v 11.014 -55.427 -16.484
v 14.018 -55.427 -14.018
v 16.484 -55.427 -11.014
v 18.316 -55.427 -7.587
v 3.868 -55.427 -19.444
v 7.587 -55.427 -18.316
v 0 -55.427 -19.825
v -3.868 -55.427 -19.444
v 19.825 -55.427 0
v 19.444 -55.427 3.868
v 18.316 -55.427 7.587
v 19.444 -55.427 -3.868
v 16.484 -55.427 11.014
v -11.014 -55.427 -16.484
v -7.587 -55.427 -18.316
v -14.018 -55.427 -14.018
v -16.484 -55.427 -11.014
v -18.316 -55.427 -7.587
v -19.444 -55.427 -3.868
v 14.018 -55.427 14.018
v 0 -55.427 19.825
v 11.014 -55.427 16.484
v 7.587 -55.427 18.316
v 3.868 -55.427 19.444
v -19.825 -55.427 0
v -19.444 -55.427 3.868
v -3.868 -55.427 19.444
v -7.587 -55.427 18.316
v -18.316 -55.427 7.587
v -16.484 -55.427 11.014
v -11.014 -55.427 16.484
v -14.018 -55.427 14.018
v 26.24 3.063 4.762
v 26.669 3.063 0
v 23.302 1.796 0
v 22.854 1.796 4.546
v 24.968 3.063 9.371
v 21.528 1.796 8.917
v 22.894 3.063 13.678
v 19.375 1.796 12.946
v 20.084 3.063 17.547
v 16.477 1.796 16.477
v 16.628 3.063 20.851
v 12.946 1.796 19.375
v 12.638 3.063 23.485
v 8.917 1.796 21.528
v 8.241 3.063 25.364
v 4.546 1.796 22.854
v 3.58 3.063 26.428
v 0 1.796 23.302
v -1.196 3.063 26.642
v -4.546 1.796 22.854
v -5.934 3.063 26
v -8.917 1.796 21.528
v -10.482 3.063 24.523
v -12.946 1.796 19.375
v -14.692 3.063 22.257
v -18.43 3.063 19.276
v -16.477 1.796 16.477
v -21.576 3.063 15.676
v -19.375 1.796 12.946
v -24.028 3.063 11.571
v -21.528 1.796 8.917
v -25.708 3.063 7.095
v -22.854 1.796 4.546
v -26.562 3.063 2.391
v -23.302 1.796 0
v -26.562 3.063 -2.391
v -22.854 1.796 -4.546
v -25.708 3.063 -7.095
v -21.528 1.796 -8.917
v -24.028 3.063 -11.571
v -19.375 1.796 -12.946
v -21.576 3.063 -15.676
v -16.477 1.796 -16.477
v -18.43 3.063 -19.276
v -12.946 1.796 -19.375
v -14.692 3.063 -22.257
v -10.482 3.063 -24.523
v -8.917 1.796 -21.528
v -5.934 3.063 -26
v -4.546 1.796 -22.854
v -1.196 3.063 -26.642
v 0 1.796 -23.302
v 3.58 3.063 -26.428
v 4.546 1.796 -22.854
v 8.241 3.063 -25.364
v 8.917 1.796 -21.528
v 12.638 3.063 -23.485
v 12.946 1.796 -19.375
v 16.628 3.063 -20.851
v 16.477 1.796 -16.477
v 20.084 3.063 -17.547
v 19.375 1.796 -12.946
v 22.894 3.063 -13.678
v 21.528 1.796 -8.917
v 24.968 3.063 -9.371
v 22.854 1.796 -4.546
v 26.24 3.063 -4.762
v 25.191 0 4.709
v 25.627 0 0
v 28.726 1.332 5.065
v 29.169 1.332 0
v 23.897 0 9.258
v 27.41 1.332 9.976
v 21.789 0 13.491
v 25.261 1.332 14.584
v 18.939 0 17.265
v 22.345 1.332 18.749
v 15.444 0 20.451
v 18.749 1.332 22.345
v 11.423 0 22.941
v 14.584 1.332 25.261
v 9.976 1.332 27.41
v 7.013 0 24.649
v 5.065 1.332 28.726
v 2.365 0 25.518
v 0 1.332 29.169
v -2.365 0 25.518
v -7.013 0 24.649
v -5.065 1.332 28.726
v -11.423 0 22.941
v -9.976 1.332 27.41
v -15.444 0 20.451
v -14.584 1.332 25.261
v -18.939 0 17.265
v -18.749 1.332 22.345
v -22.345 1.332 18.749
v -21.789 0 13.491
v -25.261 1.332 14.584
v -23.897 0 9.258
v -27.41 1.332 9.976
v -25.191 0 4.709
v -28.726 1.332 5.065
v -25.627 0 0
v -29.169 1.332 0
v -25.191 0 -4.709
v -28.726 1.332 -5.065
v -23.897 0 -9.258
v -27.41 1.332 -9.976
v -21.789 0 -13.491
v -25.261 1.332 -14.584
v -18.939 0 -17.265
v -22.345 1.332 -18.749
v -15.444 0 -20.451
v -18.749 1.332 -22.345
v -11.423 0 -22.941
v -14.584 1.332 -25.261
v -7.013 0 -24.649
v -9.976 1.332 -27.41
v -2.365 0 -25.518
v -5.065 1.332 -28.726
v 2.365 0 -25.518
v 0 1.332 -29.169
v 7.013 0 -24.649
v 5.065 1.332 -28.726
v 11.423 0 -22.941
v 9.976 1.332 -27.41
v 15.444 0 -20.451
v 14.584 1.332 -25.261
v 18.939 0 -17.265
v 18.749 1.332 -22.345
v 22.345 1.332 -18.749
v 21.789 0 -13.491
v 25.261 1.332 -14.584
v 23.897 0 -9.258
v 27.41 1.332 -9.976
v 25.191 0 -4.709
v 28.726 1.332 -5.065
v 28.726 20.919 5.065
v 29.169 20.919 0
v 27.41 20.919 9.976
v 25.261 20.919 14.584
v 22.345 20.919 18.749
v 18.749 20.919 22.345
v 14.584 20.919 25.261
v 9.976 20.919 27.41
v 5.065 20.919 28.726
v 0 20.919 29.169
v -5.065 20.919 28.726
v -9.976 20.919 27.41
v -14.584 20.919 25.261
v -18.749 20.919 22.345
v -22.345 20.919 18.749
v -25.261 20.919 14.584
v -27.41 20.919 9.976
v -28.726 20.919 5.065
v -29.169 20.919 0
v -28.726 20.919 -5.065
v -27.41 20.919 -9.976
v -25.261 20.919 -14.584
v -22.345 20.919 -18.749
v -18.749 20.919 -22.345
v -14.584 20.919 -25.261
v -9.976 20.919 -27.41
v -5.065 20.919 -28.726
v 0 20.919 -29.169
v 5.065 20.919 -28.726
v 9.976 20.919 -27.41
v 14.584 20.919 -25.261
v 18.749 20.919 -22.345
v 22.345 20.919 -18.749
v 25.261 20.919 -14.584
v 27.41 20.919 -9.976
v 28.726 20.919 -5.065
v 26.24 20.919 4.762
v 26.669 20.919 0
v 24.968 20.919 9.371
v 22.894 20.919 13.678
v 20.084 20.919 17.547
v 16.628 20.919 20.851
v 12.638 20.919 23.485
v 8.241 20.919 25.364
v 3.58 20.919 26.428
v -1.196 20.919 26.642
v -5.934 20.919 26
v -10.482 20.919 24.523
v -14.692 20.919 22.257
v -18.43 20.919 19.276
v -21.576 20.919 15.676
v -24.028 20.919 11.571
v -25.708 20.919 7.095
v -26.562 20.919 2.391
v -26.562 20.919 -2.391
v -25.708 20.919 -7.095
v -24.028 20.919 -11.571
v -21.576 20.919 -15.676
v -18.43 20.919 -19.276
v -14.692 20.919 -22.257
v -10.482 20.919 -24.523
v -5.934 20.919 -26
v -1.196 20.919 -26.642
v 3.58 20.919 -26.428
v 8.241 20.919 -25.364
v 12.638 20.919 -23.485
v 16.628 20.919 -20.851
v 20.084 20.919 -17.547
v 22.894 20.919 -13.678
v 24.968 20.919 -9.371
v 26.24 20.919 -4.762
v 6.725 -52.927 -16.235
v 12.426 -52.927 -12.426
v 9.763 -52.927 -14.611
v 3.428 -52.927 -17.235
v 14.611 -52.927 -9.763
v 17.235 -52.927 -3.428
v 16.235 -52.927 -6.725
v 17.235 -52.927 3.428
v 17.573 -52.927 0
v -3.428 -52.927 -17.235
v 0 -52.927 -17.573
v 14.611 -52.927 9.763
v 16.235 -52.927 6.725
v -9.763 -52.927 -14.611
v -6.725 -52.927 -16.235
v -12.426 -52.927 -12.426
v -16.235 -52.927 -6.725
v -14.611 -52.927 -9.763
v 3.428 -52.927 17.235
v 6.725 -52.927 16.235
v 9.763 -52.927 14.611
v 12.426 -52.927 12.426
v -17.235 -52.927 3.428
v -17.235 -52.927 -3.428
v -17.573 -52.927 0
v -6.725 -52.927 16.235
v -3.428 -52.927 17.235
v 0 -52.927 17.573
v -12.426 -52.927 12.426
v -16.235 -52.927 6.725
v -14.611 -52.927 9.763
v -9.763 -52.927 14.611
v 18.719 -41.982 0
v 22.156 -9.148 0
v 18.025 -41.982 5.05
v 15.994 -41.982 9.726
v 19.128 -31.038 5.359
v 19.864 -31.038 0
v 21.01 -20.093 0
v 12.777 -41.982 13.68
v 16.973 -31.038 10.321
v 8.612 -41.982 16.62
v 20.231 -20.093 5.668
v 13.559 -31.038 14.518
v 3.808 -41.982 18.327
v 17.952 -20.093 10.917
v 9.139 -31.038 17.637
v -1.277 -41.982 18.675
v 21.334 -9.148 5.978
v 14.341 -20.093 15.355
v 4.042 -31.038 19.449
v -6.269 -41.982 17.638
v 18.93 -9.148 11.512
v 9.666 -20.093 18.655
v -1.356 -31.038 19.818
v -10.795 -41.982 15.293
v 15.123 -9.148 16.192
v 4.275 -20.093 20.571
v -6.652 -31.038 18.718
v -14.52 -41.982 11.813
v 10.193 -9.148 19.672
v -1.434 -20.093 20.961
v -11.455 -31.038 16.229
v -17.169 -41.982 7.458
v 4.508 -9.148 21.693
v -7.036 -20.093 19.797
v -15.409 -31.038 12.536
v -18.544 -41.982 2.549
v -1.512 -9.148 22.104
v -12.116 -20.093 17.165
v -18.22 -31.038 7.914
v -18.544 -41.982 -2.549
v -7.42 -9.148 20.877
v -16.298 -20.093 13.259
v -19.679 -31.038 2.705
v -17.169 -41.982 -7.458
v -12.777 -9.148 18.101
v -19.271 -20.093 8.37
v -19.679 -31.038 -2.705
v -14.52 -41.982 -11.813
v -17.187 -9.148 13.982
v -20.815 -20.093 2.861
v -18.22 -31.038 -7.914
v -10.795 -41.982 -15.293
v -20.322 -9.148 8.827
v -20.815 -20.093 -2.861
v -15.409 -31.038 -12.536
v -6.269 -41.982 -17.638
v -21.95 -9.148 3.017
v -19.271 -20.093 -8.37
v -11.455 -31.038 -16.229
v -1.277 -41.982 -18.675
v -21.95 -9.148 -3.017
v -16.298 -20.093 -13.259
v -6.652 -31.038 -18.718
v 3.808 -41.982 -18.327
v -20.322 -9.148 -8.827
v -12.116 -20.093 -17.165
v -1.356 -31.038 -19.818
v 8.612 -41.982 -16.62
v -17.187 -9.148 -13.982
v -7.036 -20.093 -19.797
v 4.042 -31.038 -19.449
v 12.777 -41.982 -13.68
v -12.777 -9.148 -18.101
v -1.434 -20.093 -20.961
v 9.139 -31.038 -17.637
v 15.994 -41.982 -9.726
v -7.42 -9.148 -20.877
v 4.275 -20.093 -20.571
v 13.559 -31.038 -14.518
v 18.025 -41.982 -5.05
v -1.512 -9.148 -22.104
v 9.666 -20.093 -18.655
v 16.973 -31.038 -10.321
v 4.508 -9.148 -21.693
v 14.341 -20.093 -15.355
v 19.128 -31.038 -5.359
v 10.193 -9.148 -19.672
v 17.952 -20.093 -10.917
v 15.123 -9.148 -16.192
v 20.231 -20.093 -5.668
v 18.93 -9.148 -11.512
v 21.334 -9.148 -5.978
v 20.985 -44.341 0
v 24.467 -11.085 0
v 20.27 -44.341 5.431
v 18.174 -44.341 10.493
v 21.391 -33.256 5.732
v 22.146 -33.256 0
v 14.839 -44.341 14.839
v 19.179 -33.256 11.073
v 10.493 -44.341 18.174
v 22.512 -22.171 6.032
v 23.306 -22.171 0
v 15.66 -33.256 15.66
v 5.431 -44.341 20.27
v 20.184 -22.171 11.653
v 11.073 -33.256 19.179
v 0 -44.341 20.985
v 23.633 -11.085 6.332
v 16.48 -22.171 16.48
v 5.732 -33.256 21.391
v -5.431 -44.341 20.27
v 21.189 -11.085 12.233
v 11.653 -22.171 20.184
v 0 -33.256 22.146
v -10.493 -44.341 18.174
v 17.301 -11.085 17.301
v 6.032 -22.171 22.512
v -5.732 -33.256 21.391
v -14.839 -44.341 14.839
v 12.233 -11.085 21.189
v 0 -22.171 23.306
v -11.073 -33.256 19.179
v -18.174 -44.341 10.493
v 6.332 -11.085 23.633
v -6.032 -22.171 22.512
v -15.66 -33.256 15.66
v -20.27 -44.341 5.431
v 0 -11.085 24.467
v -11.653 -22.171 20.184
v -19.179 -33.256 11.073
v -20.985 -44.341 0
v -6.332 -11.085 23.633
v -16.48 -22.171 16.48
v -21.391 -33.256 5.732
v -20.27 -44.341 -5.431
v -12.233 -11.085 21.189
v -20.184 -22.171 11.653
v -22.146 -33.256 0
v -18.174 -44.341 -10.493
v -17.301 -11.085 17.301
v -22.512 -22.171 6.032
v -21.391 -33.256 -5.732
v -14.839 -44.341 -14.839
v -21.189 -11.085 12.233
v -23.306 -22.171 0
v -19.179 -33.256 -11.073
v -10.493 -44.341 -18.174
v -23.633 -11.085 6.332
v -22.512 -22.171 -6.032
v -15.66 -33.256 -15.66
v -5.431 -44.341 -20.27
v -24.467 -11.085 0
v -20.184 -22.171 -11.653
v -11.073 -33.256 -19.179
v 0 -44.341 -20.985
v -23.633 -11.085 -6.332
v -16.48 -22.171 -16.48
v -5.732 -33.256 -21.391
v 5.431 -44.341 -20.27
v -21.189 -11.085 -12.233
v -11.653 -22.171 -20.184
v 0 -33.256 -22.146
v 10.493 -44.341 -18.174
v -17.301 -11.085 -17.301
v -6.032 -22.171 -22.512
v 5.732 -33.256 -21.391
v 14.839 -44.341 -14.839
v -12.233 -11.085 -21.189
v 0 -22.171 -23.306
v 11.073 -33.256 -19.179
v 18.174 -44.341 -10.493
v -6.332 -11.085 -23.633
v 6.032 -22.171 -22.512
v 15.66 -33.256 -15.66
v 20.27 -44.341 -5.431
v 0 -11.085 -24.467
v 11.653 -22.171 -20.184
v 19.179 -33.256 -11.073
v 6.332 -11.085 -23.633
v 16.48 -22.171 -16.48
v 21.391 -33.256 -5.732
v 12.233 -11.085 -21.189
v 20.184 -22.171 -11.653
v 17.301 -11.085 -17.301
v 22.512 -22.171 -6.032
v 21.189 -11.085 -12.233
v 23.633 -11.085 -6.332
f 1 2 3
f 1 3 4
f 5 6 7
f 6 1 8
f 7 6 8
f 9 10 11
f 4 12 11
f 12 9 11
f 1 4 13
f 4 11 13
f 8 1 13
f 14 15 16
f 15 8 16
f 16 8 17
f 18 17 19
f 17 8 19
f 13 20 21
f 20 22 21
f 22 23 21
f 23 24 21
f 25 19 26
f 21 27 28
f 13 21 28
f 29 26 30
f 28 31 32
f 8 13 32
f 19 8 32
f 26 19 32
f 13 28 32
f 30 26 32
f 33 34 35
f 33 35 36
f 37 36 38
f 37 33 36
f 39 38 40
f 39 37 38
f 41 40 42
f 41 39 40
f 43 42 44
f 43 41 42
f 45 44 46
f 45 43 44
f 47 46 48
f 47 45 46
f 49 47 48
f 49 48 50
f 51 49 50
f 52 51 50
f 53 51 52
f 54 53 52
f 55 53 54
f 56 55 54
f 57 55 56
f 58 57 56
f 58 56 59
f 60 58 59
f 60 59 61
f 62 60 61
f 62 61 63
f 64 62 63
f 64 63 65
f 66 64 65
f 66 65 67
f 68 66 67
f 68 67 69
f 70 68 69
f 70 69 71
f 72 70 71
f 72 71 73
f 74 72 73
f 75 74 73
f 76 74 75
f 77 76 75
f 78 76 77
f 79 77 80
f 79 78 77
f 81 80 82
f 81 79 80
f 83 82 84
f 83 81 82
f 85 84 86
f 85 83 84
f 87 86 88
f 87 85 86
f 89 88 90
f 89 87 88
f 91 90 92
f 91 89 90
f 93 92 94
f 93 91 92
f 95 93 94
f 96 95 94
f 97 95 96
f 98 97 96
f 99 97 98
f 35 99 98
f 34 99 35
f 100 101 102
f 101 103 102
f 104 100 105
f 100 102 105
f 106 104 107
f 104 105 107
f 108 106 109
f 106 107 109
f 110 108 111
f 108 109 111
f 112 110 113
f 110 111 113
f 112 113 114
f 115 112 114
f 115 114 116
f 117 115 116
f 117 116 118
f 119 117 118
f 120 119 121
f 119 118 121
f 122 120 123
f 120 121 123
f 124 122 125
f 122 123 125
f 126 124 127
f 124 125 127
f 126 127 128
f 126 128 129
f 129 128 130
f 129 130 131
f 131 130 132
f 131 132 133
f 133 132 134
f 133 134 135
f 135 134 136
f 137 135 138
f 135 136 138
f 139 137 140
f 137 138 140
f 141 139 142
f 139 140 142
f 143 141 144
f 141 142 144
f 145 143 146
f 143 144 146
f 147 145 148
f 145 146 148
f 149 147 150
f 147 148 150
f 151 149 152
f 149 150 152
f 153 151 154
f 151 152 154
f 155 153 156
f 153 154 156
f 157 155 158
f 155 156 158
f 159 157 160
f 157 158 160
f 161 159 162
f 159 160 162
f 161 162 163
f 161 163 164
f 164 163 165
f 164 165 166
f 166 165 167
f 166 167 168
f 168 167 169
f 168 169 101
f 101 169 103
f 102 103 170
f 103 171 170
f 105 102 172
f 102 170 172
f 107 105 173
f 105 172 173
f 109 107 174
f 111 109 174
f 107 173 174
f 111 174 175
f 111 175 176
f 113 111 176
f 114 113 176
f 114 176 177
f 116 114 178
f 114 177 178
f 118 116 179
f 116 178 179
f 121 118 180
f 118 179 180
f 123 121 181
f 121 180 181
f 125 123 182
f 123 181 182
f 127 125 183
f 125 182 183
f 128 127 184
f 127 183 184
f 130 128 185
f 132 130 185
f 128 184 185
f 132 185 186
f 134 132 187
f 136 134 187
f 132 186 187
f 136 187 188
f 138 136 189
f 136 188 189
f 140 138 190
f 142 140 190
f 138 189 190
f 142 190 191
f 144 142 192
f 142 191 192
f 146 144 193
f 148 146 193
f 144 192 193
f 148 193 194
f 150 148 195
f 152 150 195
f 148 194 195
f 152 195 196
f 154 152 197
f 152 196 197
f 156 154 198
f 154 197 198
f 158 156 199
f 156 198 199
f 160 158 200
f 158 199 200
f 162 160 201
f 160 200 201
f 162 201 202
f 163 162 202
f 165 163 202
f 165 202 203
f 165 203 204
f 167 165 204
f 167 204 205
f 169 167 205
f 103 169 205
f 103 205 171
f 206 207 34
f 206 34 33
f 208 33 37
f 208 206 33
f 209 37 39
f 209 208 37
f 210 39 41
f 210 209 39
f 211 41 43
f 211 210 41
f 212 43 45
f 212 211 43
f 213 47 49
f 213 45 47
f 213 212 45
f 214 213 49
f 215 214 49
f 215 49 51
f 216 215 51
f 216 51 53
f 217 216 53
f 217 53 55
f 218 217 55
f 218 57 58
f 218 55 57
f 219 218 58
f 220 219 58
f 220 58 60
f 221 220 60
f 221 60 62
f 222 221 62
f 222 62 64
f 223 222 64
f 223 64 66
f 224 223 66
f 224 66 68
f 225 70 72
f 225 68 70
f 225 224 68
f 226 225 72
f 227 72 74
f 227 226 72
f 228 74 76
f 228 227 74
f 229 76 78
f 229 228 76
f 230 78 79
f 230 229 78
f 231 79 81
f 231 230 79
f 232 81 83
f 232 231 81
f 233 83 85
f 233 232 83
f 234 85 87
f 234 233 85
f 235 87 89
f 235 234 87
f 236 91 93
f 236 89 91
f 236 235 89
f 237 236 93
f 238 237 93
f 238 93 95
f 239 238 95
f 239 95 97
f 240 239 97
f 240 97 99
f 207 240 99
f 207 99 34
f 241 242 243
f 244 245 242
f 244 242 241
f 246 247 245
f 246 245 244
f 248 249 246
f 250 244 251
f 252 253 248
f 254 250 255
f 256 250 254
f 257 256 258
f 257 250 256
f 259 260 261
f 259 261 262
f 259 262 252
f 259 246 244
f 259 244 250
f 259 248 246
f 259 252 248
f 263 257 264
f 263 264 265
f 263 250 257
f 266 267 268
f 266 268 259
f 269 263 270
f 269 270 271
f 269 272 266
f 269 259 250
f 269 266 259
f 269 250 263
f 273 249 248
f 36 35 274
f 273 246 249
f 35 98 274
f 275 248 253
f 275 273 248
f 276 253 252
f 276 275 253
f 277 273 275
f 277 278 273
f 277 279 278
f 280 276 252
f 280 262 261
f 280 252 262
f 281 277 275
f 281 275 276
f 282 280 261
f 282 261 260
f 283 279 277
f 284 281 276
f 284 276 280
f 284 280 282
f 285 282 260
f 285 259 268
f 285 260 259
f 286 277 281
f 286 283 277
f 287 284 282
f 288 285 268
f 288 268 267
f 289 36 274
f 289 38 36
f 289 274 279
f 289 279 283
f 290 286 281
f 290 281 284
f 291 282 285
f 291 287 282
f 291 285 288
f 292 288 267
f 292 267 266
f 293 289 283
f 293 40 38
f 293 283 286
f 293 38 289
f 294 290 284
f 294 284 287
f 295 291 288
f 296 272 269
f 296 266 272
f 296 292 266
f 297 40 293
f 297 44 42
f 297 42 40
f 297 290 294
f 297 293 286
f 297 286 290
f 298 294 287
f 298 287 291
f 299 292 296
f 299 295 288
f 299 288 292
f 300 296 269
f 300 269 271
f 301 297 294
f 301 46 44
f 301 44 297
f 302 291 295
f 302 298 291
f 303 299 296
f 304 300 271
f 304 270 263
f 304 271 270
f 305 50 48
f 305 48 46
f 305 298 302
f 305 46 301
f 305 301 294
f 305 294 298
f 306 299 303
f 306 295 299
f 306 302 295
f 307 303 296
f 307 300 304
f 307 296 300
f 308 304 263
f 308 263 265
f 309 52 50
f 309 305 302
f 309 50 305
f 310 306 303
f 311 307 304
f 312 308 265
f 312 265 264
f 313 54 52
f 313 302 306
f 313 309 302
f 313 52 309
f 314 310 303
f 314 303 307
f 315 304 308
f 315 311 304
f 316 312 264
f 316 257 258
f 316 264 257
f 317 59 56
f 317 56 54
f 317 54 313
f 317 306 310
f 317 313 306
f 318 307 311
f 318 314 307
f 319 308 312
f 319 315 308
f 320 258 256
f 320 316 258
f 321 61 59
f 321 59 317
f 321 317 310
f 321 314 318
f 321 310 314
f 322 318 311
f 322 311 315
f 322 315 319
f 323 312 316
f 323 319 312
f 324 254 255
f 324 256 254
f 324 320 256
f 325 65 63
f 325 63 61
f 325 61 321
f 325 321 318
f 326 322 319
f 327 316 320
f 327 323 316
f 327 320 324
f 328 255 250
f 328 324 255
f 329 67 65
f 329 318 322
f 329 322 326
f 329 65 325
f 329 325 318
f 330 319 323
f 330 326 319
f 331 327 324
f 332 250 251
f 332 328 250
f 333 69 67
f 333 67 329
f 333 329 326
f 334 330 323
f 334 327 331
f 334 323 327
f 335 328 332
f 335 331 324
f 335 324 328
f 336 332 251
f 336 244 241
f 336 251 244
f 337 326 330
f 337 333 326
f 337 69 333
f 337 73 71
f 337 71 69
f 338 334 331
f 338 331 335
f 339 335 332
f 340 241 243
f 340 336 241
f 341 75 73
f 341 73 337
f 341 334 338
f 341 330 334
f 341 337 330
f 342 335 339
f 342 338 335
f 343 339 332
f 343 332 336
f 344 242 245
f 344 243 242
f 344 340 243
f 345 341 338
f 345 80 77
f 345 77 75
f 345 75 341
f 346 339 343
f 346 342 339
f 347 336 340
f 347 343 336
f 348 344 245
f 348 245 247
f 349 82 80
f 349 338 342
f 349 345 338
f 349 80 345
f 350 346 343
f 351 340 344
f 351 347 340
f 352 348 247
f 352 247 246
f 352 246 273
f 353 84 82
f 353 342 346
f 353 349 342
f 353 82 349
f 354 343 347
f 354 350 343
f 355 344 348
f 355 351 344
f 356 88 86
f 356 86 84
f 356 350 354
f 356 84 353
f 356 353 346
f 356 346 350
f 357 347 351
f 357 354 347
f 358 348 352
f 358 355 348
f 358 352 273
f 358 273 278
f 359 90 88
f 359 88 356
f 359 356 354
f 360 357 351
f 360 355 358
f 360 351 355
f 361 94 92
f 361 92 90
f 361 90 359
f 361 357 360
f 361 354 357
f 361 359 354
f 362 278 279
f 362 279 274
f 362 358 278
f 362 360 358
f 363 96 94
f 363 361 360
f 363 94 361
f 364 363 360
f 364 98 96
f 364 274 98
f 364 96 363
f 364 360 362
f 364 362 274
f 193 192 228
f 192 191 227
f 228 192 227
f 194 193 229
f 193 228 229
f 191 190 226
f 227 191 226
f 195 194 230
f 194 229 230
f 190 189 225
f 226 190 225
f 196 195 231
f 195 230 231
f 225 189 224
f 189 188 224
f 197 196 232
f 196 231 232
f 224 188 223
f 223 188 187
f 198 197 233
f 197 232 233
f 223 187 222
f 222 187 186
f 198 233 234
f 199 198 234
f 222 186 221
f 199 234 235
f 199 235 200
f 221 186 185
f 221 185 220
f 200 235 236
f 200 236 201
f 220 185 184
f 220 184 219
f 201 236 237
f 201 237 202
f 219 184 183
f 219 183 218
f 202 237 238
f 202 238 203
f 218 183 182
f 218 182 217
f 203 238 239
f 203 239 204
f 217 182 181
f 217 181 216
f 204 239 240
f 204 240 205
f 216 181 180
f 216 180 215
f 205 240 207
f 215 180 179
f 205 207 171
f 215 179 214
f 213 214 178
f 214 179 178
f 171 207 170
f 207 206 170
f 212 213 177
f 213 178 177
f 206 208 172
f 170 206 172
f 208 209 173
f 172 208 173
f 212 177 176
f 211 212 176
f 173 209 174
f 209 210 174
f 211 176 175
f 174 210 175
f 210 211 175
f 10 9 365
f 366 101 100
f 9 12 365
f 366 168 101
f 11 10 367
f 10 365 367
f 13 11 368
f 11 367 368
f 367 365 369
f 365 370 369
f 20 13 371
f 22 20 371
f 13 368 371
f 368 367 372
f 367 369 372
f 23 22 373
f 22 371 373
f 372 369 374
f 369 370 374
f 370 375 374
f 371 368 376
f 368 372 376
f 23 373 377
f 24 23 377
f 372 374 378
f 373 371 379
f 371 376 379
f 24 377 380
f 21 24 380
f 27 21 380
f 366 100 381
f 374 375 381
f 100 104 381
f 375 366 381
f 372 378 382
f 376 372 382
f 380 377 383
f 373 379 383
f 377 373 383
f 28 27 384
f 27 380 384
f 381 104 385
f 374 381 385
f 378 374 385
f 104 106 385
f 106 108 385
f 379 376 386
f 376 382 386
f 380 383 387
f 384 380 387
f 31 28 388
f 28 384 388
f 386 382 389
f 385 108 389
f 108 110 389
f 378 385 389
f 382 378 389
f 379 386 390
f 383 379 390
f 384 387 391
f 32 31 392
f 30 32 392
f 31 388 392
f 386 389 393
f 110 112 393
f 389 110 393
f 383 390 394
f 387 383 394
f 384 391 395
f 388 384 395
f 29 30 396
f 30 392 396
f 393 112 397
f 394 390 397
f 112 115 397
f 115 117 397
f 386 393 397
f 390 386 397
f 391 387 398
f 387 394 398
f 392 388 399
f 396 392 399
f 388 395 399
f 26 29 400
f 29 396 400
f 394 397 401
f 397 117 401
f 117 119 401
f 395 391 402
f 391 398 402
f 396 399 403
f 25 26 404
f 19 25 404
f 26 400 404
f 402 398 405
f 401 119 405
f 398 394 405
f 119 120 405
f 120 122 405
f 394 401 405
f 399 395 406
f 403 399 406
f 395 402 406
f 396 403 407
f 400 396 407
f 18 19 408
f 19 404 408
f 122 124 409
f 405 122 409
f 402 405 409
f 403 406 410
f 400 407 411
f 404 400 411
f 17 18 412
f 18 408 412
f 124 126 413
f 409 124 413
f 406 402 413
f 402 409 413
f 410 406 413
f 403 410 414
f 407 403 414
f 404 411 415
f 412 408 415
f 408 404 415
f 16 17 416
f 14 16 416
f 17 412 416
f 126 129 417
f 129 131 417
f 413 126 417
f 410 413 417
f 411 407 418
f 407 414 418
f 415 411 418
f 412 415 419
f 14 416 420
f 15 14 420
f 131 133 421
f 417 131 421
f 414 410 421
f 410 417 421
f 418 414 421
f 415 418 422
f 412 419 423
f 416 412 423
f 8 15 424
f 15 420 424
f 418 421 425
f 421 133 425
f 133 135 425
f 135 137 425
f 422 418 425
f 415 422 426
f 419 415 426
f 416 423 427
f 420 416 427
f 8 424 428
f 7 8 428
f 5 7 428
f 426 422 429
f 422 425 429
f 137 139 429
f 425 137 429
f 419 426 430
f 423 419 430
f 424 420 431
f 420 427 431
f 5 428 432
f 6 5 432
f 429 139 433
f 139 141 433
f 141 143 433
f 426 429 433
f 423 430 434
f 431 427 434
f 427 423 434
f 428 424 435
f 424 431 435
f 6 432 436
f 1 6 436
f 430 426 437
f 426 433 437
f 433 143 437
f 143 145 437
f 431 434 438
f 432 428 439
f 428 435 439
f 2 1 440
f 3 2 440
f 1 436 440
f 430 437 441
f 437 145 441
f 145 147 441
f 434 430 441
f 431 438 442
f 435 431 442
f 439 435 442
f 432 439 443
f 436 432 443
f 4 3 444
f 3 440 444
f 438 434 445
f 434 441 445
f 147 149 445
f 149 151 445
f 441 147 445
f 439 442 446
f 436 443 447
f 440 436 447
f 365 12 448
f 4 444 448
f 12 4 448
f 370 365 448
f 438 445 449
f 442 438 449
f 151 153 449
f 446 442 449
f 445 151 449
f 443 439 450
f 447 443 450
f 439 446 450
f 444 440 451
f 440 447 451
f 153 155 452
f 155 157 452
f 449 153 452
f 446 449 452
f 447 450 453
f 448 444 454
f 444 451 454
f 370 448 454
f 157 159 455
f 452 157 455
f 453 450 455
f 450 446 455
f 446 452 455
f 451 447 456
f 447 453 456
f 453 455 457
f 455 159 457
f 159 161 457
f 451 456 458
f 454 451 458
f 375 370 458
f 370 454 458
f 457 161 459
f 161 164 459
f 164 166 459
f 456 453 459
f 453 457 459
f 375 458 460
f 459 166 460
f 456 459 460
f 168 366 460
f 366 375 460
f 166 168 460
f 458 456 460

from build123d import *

# Parameters (mm, degrees)
F2_T = -2.5


with BuildPart() as f1:
    # F0 (on Top) → F1 (revolve)
    with BuildSketch(Plane.XY):
        Polygon((29.168965295, 20.9186449647), (0, 20.9186449647), (0, -55.4267726839), (19.8249841153, -55.4267726839), (25.6272411018, 0), (29.168965295, 1.331854861), align=None)
    revolve(axis=Axis((0, 0.3053806722, 0), (0, -1, 0)))

    # F2
    f2_openings = [f1.faces().sort_by_distance(p)[0] for p in [
        (0, 20.918645, 0),
    ]]
    offset(amount=F2_T, openings=f2_openings, kind=Kind.INTERSECTION)


solid = f1.part
